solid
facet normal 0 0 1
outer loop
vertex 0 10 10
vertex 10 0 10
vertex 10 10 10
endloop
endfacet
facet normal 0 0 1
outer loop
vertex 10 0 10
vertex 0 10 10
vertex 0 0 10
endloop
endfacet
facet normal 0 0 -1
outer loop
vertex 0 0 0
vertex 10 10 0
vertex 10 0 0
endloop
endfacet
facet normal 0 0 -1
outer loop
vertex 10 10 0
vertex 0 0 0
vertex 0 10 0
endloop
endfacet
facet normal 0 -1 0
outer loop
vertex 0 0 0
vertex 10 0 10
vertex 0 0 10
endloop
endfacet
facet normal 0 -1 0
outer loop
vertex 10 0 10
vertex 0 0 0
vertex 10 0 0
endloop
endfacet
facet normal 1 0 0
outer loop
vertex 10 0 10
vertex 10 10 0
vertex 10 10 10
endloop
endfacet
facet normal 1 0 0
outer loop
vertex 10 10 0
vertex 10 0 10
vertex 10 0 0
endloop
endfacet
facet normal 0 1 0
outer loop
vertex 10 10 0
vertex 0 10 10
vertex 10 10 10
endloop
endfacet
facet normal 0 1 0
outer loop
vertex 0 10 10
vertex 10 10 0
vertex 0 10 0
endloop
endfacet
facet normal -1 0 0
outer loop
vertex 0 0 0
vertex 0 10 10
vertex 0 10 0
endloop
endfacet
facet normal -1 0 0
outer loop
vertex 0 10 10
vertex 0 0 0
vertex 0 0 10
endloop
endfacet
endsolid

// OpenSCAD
// Cube 10mm, written by Rene K. Mueller <spiritdude@gmail.com>
//
// License: GPLv2
//
// History:
// 2013/02/12: first version
//
// Features:
// simplicity, good to measure exact extrusion

// units [mm]

cube (size = 10);
